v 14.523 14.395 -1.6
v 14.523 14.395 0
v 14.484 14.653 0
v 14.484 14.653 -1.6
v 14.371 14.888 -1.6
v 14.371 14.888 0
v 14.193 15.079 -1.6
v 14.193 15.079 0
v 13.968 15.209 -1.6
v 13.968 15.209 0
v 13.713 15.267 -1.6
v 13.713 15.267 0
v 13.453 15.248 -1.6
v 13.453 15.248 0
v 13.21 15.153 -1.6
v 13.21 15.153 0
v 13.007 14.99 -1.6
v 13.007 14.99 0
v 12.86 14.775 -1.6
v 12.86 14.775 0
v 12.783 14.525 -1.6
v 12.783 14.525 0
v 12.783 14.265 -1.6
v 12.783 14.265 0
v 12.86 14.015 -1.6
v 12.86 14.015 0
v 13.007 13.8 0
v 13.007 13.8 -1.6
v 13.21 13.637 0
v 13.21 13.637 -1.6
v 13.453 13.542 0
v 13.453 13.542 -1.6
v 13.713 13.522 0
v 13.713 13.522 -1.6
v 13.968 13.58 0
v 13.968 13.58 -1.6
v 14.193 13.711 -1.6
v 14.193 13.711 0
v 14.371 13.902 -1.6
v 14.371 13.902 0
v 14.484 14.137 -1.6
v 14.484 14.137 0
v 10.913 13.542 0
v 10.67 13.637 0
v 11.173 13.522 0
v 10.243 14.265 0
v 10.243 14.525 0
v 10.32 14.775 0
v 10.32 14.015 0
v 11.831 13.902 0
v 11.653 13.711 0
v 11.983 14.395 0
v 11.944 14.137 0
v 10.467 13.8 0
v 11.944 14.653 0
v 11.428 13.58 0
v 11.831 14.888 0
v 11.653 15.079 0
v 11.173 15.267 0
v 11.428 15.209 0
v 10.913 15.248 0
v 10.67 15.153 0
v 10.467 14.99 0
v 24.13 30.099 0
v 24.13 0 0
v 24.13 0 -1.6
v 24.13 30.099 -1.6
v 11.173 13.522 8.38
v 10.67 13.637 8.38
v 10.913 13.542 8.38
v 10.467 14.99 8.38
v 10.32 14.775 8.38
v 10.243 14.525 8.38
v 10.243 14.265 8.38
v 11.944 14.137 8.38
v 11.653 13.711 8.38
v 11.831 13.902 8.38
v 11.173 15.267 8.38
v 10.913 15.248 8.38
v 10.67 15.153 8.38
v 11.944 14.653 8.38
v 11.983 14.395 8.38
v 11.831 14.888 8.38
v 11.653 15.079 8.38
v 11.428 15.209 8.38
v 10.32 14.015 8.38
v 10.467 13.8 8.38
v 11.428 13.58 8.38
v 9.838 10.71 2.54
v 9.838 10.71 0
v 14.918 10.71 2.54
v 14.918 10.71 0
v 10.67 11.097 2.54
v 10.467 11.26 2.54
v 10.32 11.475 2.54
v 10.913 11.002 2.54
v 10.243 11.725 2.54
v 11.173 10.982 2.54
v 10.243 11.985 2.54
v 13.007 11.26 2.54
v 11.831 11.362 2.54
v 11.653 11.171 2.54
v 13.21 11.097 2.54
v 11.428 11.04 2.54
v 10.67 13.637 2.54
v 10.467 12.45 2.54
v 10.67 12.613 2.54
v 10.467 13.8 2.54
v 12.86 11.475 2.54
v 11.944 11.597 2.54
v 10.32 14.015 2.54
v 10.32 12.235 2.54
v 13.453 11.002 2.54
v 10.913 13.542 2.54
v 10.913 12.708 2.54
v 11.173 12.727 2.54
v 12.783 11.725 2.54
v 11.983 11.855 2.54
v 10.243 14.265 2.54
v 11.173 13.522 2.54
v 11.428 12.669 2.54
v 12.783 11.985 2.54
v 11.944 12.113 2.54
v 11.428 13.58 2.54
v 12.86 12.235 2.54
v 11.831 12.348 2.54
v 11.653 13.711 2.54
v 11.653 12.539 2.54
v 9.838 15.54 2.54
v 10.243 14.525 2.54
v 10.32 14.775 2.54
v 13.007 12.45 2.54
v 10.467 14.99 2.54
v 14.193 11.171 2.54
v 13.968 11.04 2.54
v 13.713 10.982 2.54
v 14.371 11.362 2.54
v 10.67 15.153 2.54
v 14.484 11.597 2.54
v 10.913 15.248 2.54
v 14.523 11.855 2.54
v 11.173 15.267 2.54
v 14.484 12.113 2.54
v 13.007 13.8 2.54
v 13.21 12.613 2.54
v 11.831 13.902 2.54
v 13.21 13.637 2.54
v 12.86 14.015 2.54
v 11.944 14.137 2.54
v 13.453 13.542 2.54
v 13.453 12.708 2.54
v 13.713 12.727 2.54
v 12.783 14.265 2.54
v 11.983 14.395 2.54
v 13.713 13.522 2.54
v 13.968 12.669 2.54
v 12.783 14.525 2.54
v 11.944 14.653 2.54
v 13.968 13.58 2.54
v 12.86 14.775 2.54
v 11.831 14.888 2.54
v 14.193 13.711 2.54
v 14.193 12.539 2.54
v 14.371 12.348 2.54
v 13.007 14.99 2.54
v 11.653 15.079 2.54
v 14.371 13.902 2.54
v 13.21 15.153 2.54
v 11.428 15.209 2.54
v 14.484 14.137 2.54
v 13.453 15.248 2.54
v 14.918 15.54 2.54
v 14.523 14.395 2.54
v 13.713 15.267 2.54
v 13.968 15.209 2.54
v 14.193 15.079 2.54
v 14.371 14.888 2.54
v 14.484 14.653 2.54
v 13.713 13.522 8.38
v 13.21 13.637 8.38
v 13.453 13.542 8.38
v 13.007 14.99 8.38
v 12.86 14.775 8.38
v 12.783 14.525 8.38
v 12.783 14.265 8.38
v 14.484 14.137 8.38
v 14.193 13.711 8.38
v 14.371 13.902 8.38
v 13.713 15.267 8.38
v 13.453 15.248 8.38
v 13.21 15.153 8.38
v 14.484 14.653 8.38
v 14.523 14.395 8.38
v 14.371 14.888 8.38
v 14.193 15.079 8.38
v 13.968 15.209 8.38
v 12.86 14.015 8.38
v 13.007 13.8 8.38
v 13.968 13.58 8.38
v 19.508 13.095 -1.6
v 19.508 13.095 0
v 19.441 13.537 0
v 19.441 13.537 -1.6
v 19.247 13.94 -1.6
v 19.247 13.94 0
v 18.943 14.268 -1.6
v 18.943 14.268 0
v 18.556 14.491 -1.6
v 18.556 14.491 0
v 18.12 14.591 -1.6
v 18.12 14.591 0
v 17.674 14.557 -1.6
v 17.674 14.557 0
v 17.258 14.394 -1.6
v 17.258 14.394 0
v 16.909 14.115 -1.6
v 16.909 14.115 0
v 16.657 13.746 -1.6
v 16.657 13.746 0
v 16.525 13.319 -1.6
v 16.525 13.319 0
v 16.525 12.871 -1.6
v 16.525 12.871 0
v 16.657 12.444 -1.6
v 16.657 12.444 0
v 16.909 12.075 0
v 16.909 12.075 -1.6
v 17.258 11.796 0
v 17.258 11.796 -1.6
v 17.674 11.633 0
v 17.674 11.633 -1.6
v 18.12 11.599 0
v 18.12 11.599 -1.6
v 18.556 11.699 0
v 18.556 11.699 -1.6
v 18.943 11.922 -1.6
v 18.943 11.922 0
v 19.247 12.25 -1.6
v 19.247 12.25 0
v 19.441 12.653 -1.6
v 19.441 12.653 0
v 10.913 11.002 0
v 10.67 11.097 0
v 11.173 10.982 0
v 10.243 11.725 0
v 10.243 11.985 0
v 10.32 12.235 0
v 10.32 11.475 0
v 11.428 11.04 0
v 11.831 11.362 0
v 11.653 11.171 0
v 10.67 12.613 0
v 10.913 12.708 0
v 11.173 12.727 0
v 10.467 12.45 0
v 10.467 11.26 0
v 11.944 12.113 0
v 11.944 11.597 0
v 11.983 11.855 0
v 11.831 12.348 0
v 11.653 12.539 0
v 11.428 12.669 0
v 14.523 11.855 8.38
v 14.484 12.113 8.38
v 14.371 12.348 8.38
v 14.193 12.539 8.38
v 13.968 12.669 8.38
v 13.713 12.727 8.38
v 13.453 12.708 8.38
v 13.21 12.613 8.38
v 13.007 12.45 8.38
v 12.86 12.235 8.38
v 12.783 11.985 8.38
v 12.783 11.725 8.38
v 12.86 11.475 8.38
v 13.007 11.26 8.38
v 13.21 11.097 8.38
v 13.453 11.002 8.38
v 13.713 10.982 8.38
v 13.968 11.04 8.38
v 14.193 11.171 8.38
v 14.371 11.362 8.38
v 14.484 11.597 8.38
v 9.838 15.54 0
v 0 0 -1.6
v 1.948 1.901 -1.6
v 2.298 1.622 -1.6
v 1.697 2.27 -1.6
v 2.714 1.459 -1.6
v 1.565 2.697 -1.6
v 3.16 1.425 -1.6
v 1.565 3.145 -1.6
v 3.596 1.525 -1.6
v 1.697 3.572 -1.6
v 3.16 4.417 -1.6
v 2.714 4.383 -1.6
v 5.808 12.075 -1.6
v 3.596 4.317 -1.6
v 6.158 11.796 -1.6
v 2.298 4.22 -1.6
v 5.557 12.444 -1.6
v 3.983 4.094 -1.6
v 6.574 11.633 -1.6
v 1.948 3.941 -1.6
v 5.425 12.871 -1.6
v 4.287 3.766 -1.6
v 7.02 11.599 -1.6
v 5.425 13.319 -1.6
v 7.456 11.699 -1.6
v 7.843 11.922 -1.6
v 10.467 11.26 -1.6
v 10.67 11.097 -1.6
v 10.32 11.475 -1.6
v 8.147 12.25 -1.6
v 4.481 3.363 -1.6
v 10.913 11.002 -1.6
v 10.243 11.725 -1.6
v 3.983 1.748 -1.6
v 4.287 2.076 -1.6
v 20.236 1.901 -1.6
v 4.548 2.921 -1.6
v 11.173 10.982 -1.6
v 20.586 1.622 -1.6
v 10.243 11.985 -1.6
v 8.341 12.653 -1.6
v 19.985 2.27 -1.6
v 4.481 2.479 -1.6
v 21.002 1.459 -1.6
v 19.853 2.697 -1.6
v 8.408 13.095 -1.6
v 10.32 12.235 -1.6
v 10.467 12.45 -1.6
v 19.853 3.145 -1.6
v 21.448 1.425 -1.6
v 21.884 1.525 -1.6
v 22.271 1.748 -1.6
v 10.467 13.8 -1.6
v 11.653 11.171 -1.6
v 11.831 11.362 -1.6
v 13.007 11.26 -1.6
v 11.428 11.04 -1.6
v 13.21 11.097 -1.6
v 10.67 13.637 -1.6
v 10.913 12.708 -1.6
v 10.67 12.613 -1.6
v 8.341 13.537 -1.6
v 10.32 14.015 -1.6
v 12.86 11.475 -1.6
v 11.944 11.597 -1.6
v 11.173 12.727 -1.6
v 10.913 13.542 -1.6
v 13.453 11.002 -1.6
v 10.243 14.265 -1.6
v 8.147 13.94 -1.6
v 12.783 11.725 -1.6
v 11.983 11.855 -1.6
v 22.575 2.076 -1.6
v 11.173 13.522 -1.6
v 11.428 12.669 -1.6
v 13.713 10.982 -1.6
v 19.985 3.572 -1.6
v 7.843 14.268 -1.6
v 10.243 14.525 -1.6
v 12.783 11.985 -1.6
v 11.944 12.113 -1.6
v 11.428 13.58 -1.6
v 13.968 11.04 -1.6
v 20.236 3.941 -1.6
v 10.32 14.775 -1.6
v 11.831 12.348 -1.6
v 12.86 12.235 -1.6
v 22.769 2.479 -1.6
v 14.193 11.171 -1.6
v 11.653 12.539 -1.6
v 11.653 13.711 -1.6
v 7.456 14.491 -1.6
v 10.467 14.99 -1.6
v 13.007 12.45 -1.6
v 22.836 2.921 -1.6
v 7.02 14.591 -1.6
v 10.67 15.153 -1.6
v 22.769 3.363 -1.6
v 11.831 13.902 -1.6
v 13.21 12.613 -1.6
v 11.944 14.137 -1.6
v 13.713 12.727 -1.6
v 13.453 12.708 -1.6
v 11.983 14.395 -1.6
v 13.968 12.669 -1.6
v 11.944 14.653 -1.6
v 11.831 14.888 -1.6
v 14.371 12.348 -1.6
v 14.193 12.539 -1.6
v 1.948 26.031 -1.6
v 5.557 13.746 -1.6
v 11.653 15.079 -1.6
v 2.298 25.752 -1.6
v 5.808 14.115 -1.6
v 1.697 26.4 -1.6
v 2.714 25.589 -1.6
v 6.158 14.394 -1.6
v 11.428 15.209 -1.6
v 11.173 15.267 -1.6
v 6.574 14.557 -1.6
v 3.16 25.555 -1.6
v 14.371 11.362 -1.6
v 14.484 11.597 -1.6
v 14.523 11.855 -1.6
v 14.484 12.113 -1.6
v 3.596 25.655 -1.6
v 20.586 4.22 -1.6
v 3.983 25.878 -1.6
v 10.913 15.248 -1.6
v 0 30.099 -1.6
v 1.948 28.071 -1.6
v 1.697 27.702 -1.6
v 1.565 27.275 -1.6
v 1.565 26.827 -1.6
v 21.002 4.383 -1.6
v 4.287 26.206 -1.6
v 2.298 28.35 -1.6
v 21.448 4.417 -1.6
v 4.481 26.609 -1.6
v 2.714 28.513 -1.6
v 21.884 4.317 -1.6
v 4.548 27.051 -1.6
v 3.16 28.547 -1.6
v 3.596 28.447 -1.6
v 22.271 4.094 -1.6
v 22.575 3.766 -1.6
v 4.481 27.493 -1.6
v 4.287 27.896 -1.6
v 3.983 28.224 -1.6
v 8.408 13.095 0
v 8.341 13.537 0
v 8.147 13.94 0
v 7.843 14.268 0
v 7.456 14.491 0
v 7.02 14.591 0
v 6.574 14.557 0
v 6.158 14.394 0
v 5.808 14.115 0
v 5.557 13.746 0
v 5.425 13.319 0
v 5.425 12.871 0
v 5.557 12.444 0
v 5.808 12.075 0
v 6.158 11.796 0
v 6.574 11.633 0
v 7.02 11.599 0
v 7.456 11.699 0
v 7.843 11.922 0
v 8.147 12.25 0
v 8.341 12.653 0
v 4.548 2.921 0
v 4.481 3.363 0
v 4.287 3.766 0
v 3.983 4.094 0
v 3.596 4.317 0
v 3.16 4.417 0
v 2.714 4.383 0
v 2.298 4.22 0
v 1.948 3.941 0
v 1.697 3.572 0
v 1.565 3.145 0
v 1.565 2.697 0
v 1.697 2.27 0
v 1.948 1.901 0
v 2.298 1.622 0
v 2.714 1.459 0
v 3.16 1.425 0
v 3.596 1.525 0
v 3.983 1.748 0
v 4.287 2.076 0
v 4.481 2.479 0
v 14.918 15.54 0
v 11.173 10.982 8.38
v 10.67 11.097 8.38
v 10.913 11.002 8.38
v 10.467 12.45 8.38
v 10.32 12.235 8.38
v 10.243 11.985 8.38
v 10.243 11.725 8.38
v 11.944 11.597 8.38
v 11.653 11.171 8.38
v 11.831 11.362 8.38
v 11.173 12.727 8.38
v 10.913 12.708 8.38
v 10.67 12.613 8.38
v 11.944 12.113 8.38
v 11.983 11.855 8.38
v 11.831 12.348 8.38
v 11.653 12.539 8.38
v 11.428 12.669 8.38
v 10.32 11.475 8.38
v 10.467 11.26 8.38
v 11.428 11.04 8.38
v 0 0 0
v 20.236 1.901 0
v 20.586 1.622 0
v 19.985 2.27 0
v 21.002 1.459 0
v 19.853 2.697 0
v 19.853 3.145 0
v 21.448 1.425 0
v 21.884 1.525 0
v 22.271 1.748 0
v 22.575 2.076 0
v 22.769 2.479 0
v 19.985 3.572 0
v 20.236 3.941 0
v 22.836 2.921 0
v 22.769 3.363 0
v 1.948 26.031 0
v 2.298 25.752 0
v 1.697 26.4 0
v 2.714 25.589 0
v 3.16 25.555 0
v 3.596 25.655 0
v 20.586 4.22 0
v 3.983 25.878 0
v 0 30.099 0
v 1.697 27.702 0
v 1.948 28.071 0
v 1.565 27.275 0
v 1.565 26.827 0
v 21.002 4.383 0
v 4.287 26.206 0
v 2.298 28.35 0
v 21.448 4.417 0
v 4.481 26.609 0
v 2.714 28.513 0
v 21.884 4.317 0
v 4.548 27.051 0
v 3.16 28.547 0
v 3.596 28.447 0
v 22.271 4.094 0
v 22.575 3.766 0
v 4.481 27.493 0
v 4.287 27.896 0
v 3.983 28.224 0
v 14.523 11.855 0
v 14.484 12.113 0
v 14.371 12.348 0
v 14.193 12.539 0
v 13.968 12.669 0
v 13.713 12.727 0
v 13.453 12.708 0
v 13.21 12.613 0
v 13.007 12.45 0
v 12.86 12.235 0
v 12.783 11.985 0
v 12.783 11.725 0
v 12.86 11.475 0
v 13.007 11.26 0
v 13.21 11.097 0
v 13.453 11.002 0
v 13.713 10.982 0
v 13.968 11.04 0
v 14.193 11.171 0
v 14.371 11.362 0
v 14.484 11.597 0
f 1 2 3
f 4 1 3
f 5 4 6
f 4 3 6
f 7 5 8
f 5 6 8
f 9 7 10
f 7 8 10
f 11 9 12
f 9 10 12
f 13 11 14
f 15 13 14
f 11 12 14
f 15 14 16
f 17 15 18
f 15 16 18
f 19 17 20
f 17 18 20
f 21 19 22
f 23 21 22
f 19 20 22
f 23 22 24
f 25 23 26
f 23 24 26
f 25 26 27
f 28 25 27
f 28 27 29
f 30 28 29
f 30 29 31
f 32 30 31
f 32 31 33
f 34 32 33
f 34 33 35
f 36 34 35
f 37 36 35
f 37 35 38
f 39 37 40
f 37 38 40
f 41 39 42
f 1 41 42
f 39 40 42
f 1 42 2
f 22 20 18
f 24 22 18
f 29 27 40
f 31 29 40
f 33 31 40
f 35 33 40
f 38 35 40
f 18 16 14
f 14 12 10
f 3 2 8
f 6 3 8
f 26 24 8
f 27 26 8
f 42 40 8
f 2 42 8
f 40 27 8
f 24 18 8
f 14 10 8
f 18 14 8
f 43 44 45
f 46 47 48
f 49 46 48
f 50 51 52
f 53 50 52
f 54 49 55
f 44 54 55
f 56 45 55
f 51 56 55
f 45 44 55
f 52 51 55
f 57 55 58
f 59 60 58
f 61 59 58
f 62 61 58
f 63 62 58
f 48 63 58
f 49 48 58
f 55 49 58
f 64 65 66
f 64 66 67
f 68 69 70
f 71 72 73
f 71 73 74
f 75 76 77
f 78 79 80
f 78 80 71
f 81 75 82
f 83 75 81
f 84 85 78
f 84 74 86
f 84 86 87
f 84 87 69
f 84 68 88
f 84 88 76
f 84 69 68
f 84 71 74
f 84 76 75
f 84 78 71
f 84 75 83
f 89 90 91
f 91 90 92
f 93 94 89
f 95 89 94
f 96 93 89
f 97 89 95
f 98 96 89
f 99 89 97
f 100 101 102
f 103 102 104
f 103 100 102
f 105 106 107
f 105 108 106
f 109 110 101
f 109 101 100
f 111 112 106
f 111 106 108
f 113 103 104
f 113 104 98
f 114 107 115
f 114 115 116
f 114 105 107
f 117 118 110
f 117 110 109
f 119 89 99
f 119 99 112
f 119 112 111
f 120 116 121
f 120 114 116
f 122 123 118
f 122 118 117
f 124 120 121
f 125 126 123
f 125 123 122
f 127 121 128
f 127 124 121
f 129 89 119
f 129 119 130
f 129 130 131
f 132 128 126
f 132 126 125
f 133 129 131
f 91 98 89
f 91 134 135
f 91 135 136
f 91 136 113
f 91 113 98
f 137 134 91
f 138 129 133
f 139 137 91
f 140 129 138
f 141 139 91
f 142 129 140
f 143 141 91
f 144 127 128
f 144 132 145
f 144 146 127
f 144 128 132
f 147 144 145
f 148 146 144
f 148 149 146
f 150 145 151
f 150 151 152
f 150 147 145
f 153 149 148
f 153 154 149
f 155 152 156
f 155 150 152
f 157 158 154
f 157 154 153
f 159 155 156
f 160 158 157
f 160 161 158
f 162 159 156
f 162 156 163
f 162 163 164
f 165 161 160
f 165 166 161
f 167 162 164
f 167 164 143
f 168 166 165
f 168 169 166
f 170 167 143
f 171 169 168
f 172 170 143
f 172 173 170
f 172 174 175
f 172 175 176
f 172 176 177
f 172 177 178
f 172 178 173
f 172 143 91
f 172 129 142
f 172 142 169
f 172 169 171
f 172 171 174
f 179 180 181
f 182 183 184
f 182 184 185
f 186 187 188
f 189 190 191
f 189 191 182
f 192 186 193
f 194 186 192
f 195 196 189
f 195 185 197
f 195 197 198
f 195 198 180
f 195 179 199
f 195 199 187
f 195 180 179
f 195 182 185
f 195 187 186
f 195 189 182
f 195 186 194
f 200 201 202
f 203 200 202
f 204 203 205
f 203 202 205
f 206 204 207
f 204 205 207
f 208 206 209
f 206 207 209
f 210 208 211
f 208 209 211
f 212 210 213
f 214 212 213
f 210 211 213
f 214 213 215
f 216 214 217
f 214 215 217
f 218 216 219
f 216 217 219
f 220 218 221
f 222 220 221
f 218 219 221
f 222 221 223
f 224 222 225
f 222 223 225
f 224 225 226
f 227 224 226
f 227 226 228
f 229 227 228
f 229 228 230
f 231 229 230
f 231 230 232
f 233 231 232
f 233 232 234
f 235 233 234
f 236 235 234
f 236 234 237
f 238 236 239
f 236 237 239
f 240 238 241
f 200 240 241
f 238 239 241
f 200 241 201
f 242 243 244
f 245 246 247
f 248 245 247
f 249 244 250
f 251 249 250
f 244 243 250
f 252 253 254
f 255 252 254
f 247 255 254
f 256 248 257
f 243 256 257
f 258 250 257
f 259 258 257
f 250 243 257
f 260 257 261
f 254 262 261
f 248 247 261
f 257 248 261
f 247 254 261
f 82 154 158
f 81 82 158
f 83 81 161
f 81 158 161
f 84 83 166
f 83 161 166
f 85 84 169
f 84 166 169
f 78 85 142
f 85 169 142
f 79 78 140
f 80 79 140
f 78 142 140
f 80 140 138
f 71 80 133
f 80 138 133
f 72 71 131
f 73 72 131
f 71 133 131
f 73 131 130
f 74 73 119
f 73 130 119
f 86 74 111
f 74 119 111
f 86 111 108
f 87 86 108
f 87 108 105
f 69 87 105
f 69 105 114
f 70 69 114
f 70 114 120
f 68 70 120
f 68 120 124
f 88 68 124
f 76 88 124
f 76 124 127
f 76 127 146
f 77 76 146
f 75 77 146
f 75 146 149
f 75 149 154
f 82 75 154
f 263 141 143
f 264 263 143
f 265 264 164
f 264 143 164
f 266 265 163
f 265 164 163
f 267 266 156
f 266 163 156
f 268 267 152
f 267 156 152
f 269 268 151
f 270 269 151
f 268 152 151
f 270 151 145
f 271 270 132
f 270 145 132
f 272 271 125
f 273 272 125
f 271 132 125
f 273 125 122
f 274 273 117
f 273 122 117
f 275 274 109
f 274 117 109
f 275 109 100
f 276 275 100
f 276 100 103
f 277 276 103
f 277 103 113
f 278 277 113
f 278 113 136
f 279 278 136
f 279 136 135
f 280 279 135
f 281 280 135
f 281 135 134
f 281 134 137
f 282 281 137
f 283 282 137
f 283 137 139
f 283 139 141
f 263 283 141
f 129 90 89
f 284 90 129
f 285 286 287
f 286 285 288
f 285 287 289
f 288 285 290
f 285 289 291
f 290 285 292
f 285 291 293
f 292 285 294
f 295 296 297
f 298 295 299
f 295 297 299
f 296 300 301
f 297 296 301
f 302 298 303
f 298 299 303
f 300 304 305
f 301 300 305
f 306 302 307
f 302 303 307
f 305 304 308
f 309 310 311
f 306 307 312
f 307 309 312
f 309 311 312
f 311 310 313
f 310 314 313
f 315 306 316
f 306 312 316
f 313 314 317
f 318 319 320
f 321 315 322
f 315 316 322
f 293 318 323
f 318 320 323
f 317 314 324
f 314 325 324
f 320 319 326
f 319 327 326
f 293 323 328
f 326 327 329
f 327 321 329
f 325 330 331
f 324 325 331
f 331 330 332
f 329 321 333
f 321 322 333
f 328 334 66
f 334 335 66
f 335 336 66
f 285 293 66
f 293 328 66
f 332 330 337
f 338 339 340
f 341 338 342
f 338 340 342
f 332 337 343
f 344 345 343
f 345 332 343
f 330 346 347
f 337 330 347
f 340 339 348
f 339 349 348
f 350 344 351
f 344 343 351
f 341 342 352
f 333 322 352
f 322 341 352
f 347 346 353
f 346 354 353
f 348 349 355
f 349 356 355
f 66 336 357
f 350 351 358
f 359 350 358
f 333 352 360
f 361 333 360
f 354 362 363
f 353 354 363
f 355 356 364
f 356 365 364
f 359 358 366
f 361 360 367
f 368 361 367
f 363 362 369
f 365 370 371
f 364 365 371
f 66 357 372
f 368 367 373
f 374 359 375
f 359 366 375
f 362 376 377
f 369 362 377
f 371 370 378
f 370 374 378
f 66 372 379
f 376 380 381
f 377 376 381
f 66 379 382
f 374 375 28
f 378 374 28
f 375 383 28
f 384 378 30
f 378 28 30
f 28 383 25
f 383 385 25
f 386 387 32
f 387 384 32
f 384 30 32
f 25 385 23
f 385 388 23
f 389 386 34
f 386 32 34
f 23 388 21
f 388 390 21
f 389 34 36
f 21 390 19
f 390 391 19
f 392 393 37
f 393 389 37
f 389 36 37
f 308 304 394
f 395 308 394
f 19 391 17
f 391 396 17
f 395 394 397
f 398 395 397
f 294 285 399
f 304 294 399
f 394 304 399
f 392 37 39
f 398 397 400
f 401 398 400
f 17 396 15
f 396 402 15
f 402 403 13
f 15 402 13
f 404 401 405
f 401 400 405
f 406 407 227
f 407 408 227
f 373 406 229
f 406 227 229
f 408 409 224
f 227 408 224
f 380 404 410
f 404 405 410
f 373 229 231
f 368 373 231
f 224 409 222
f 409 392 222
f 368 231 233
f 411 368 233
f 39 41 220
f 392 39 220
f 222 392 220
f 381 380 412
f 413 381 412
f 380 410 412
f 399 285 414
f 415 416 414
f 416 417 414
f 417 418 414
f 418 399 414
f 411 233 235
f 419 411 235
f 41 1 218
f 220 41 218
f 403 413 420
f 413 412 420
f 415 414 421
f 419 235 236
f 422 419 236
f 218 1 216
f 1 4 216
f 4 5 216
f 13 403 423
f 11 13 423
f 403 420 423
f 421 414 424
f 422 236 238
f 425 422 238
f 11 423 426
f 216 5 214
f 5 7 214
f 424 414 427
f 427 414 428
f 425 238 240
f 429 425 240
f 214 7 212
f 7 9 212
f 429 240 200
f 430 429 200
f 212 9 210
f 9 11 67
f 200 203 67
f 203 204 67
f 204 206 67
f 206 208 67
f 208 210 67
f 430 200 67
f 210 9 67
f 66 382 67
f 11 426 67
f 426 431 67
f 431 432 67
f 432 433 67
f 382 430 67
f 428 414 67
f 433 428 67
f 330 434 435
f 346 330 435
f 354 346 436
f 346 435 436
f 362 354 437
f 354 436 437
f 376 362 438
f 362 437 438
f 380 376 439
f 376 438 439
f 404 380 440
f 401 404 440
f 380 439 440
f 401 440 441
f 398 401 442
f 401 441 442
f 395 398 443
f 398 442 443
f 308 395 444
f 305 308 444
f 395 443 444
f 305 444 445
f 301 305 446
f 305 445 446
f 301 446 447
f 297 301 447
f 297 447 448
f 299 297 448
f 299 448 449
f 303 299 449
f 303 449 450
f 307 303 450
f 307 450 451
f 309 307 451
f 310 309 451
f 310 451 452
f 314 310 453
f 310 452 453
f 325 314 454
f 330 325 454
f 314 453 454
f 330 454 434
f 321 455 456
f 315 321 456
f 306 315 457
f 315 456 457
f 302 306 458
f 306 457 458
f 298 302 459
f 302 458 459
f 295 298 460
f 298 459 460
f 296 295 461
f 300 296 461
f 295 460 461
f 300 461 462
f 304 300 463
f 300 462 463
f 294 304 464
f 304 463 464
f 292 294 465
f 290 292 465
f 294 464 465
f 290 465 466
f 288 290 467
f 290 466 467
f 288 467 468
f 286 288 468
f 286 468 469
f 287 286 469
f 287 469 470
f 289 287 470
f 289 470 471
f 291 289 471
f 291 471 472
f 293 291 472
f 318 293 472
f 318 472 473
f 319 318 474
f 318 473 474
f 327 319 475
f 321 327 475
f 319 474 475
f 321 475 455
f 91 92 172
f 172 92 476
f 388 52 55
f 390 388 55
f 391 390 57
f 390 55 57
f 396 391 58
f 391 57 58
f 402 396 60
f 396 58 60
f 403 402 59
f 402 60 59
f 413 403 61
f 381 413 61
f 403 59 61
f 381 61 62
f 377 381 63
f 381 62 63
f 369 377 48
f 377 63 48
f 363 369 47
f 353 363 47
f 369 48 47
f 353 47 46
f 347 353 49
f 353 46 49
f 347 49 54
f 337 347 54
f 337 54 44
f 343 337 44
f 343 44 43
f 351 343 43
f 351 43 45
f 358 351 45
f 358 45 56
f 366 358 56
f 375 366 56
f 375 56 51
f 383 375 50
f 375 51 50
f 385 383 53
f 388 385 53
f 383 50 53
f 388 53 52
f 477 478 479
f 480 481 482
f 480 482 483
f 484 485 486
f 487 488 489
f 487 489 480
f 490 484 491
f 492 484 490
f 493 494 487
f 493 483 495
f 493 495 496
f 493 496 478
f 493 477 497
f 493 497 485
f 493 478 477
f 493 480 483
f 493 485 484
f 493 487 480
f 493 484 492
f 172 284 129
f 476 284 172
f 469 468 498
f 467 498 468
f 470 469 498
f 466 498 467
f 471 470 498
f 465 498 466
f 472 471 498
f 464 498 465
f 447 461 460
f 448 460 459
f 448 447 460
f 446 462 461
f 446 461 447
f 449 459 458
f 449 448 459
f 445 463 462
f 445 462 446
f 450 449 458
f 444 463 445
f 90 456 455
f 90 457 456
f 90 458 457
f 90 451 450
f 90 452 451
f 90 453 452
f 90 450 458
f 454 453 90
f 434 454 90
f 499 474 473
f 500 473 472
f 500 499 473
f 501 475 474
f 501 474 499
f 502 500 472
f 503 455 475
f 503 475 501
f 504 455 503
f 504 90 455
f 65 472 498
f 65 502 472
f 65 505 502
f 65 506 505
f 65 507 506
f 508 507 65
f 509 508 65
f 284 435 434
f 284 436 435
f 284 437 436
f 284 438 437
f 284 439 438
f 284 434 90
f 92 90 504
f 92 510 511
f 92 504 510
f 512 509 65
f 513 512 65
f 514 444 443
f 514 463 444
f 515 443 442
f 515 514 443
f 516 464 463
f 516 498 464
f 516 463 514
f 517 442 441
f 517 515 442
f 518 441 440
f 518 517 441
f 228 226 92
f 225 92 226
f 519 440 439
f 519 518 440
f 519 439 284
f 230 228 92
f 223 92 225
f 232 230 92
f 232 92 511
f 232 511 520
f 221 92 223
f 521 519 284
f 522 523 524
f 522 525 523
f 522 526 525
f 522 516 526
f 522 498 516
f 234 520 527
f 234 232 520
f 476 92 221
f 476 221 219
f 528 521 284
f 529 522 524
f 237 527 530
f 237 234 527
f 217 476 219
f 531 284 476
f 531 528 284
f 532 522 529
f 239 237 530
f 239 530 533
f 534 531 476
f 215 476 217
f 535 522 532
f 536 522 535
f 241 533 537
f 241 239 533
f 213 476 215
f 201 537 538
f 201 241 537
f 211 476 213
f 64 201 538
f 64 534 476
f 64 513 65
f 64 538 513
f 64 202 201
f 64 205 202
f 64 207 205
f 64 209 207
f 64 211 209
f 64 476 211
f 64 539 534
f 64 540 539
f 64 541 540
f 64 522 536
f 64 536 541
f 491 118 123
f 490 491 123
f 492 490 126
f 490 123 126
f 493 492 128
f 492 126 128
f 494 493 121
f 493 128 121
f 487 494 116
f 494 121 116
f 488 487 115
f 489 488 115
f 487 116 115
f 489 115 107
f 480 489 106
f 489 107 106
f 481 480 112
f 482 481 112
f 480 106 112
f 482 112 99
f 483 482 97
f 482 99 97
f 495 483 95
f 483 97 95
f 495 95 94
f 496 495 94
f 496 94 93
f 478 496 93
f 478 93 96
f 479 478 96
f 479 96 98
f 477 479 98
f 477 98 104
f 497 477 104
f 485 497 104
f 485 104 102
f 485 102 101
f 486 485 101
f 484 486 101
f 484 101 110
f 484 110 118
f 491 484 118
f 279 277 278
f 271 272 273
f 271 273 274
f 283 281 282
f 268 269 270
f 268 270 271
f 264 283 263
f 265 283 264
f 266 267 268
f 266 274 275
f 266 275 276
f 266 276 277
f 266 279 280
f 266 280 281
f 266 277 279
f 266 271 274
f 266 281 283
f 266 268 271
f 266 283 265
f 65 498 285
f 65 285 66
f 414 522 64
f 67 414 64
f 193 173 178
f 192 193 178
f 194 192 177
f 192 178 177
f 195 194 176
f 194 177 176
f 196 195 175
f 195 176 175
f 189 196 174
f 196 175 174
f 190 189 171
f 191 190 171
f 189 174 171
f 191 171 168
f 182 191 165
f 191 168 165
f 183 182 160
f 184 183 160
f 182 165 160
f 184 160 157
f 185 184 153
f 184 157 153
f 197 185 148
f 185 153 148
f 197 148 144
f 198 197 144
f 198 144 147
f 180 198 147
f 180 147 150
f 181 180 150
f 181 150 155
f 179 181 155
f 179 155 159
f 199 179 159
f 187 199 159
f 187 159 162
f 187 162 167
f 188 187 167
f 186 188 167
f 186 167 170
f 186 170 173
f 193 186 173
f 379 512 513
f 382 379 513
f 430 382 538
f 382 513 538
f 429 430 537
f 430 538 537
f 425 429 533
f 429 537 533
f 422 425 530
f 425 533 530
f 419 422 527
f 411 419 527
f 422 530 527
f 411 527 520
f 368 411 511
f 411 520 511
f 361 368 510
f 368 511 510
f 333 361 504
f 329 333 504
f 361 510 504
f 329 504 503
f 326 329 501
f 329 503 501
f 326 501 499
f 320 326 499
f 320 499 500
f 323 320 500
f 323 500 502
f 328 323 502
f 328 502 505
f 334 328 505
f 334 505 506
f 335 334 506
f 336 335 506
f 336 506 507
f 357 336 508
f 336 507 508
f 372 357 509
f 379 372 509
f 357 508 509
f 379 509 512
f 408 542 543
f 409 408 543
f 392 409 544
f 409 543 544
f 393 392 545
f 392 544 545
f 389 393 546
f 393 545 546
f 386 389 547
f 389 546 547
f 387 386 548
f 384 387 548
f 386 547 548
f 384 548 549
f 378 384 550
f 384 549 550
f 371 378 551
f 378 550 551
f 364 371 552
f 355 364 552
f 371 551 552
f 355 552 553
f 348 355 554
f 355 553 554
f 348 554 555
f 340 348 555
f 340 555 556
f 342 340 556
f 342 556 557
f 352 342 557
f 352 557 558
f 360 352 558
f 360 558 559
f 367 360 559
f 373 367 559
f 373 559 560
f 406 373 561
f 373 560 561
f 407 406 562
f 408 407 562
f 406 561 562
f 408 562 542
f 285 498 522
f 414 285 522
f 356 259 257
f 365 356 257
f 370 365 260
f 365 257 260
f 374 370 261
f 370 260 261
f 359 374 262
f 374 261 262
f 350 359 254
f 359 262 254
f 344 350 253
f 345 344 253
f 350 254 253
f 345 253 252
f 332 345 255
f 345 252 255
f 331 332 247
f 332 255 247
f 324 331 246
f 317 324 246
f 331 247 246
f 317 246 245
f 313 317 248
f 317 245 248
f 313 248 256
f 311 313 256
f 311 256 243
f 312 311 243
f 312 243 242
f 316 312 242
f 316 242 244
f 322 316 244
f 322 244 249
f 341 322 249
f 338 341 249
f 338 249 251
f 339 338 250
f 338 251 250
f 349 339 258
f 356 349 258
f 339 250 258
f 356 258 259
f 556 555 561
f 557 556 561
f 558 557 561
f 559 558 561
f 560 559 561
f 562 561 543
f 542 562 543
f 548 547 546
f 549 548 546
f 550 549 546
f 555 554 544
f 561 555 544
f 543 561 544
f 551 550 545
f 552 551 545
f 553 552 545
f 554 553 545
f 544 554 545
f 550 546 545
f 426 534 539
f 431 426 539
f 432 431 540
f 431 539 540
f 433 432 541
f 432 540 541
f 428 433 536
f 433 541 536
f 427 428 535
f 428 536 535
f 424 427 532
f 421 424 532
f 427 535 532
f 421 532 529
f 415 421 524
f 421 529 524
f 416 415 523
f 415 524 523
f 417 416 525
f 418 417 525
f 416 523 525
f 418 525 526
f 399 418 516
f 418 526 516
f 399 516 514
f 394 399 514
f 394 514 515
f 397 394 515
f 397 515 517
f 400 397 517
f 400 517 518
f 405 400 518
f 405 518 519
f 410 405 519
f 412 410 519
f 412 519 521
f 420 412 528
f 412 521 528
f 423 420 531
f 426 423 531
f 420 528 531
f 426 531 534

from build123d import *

# Parameters (mm, degrees)
SKETCH1_W           = 24.13
SKETCH1_H           = 30.099
SKETCH1_R           = 1.5
SKETCH1_R_2         = 0.875
BOSS_EXTRUDE1_DEPTH = 1.6
SKETCH1_19_W        = 5.08
SKETCH1_19_H        = 4.83
BOSS_EXTRUDE2_DEPTH = 2.54
BOSS_EXTRUDE3_START = 8.38
SKETCH1_20_R        = 0.875
BOSS_EXTRUDE3_DEPTH = 8.38


with BuildPart() as part:
    # Sketch1 → Boss-Extrude1 (new body)
    with BuildSketch(Plane.XY):
        with Locations((12.065, 15.0495)):
            Rectangle(SKETCH1_W, SKETCH1_H)
        with Locations((3.048, 2.921)):
            Circle(SKETCH1_R, mode=Mode.SUBTRACT)
        with Locations((6.908038, 13.09497)):
            Circle(SKETCH1_R, mode=Mode.SUBTRACT)
        with Locations((21.336, 2.921)):
            Circle(SKETCH1_R, mode=Mode.SUBTRACT)
        with Locations((18.008092, 13.09497)):
            Circle(SKETCH1_R, mode=Mode.SUBTRACT)
        with Locations((3.048, 27.051)):
            Circle(SKETCH1_R, mode=Mode.SUBTRACT)
        with Locations((11.107928, 11.854942)):
            Circle(SKETCH1_R_2, mode=Mode.SUBTRACT)
        with Locations((11.107928, 14.394942)):
            Circle(SKETCH1_R_2, mode=Mode.SUBTRACT)
        with Locations((13.647928, 11.854942)):
            Circle(SKETCH1_R_2, mode=Mode.SUBTRACT)
        with Locations((13.647928, 14.394942)):
            Circle(SKETCH1_R_2, mode=Mode.SUBTRACT)
    extrude(amount=-BOSS_EXTRUDE1_DEPTH)

    # Sketch1<19> → Boss-Extrude2 (add)
    with BuildSketch(Plane.XY):
        with Locations((12.377928, 13.124942)):
            Rectangle(SKETCH1_19_W, SKETCH1_19_H)
    extrude(amount=BOSS_EXTRUDE2_DEPTH)

    # Sketch1<20> → Boss-Extrude3 (add)
    with BuildSketch(Plane.XY.offset(BOSS_EXTRUDE3_START)):
        with Locations((11.107928, 14.394942)):
            Circle(SKETCH1_20_R)
        with Locations((13.647928, 14.394942)):
            Circle(SKETCH1_20_R)
        with Locations((11.107928, 11.854942)):
            Circle(SKETCH1_20_R)
        with Locations((13.647928, 11.854942)):
            Circle(SKETCH1_20_R)
    extrude(amount=-BOSS_EXTRUDE3_DEPTH)


solid = part.part
